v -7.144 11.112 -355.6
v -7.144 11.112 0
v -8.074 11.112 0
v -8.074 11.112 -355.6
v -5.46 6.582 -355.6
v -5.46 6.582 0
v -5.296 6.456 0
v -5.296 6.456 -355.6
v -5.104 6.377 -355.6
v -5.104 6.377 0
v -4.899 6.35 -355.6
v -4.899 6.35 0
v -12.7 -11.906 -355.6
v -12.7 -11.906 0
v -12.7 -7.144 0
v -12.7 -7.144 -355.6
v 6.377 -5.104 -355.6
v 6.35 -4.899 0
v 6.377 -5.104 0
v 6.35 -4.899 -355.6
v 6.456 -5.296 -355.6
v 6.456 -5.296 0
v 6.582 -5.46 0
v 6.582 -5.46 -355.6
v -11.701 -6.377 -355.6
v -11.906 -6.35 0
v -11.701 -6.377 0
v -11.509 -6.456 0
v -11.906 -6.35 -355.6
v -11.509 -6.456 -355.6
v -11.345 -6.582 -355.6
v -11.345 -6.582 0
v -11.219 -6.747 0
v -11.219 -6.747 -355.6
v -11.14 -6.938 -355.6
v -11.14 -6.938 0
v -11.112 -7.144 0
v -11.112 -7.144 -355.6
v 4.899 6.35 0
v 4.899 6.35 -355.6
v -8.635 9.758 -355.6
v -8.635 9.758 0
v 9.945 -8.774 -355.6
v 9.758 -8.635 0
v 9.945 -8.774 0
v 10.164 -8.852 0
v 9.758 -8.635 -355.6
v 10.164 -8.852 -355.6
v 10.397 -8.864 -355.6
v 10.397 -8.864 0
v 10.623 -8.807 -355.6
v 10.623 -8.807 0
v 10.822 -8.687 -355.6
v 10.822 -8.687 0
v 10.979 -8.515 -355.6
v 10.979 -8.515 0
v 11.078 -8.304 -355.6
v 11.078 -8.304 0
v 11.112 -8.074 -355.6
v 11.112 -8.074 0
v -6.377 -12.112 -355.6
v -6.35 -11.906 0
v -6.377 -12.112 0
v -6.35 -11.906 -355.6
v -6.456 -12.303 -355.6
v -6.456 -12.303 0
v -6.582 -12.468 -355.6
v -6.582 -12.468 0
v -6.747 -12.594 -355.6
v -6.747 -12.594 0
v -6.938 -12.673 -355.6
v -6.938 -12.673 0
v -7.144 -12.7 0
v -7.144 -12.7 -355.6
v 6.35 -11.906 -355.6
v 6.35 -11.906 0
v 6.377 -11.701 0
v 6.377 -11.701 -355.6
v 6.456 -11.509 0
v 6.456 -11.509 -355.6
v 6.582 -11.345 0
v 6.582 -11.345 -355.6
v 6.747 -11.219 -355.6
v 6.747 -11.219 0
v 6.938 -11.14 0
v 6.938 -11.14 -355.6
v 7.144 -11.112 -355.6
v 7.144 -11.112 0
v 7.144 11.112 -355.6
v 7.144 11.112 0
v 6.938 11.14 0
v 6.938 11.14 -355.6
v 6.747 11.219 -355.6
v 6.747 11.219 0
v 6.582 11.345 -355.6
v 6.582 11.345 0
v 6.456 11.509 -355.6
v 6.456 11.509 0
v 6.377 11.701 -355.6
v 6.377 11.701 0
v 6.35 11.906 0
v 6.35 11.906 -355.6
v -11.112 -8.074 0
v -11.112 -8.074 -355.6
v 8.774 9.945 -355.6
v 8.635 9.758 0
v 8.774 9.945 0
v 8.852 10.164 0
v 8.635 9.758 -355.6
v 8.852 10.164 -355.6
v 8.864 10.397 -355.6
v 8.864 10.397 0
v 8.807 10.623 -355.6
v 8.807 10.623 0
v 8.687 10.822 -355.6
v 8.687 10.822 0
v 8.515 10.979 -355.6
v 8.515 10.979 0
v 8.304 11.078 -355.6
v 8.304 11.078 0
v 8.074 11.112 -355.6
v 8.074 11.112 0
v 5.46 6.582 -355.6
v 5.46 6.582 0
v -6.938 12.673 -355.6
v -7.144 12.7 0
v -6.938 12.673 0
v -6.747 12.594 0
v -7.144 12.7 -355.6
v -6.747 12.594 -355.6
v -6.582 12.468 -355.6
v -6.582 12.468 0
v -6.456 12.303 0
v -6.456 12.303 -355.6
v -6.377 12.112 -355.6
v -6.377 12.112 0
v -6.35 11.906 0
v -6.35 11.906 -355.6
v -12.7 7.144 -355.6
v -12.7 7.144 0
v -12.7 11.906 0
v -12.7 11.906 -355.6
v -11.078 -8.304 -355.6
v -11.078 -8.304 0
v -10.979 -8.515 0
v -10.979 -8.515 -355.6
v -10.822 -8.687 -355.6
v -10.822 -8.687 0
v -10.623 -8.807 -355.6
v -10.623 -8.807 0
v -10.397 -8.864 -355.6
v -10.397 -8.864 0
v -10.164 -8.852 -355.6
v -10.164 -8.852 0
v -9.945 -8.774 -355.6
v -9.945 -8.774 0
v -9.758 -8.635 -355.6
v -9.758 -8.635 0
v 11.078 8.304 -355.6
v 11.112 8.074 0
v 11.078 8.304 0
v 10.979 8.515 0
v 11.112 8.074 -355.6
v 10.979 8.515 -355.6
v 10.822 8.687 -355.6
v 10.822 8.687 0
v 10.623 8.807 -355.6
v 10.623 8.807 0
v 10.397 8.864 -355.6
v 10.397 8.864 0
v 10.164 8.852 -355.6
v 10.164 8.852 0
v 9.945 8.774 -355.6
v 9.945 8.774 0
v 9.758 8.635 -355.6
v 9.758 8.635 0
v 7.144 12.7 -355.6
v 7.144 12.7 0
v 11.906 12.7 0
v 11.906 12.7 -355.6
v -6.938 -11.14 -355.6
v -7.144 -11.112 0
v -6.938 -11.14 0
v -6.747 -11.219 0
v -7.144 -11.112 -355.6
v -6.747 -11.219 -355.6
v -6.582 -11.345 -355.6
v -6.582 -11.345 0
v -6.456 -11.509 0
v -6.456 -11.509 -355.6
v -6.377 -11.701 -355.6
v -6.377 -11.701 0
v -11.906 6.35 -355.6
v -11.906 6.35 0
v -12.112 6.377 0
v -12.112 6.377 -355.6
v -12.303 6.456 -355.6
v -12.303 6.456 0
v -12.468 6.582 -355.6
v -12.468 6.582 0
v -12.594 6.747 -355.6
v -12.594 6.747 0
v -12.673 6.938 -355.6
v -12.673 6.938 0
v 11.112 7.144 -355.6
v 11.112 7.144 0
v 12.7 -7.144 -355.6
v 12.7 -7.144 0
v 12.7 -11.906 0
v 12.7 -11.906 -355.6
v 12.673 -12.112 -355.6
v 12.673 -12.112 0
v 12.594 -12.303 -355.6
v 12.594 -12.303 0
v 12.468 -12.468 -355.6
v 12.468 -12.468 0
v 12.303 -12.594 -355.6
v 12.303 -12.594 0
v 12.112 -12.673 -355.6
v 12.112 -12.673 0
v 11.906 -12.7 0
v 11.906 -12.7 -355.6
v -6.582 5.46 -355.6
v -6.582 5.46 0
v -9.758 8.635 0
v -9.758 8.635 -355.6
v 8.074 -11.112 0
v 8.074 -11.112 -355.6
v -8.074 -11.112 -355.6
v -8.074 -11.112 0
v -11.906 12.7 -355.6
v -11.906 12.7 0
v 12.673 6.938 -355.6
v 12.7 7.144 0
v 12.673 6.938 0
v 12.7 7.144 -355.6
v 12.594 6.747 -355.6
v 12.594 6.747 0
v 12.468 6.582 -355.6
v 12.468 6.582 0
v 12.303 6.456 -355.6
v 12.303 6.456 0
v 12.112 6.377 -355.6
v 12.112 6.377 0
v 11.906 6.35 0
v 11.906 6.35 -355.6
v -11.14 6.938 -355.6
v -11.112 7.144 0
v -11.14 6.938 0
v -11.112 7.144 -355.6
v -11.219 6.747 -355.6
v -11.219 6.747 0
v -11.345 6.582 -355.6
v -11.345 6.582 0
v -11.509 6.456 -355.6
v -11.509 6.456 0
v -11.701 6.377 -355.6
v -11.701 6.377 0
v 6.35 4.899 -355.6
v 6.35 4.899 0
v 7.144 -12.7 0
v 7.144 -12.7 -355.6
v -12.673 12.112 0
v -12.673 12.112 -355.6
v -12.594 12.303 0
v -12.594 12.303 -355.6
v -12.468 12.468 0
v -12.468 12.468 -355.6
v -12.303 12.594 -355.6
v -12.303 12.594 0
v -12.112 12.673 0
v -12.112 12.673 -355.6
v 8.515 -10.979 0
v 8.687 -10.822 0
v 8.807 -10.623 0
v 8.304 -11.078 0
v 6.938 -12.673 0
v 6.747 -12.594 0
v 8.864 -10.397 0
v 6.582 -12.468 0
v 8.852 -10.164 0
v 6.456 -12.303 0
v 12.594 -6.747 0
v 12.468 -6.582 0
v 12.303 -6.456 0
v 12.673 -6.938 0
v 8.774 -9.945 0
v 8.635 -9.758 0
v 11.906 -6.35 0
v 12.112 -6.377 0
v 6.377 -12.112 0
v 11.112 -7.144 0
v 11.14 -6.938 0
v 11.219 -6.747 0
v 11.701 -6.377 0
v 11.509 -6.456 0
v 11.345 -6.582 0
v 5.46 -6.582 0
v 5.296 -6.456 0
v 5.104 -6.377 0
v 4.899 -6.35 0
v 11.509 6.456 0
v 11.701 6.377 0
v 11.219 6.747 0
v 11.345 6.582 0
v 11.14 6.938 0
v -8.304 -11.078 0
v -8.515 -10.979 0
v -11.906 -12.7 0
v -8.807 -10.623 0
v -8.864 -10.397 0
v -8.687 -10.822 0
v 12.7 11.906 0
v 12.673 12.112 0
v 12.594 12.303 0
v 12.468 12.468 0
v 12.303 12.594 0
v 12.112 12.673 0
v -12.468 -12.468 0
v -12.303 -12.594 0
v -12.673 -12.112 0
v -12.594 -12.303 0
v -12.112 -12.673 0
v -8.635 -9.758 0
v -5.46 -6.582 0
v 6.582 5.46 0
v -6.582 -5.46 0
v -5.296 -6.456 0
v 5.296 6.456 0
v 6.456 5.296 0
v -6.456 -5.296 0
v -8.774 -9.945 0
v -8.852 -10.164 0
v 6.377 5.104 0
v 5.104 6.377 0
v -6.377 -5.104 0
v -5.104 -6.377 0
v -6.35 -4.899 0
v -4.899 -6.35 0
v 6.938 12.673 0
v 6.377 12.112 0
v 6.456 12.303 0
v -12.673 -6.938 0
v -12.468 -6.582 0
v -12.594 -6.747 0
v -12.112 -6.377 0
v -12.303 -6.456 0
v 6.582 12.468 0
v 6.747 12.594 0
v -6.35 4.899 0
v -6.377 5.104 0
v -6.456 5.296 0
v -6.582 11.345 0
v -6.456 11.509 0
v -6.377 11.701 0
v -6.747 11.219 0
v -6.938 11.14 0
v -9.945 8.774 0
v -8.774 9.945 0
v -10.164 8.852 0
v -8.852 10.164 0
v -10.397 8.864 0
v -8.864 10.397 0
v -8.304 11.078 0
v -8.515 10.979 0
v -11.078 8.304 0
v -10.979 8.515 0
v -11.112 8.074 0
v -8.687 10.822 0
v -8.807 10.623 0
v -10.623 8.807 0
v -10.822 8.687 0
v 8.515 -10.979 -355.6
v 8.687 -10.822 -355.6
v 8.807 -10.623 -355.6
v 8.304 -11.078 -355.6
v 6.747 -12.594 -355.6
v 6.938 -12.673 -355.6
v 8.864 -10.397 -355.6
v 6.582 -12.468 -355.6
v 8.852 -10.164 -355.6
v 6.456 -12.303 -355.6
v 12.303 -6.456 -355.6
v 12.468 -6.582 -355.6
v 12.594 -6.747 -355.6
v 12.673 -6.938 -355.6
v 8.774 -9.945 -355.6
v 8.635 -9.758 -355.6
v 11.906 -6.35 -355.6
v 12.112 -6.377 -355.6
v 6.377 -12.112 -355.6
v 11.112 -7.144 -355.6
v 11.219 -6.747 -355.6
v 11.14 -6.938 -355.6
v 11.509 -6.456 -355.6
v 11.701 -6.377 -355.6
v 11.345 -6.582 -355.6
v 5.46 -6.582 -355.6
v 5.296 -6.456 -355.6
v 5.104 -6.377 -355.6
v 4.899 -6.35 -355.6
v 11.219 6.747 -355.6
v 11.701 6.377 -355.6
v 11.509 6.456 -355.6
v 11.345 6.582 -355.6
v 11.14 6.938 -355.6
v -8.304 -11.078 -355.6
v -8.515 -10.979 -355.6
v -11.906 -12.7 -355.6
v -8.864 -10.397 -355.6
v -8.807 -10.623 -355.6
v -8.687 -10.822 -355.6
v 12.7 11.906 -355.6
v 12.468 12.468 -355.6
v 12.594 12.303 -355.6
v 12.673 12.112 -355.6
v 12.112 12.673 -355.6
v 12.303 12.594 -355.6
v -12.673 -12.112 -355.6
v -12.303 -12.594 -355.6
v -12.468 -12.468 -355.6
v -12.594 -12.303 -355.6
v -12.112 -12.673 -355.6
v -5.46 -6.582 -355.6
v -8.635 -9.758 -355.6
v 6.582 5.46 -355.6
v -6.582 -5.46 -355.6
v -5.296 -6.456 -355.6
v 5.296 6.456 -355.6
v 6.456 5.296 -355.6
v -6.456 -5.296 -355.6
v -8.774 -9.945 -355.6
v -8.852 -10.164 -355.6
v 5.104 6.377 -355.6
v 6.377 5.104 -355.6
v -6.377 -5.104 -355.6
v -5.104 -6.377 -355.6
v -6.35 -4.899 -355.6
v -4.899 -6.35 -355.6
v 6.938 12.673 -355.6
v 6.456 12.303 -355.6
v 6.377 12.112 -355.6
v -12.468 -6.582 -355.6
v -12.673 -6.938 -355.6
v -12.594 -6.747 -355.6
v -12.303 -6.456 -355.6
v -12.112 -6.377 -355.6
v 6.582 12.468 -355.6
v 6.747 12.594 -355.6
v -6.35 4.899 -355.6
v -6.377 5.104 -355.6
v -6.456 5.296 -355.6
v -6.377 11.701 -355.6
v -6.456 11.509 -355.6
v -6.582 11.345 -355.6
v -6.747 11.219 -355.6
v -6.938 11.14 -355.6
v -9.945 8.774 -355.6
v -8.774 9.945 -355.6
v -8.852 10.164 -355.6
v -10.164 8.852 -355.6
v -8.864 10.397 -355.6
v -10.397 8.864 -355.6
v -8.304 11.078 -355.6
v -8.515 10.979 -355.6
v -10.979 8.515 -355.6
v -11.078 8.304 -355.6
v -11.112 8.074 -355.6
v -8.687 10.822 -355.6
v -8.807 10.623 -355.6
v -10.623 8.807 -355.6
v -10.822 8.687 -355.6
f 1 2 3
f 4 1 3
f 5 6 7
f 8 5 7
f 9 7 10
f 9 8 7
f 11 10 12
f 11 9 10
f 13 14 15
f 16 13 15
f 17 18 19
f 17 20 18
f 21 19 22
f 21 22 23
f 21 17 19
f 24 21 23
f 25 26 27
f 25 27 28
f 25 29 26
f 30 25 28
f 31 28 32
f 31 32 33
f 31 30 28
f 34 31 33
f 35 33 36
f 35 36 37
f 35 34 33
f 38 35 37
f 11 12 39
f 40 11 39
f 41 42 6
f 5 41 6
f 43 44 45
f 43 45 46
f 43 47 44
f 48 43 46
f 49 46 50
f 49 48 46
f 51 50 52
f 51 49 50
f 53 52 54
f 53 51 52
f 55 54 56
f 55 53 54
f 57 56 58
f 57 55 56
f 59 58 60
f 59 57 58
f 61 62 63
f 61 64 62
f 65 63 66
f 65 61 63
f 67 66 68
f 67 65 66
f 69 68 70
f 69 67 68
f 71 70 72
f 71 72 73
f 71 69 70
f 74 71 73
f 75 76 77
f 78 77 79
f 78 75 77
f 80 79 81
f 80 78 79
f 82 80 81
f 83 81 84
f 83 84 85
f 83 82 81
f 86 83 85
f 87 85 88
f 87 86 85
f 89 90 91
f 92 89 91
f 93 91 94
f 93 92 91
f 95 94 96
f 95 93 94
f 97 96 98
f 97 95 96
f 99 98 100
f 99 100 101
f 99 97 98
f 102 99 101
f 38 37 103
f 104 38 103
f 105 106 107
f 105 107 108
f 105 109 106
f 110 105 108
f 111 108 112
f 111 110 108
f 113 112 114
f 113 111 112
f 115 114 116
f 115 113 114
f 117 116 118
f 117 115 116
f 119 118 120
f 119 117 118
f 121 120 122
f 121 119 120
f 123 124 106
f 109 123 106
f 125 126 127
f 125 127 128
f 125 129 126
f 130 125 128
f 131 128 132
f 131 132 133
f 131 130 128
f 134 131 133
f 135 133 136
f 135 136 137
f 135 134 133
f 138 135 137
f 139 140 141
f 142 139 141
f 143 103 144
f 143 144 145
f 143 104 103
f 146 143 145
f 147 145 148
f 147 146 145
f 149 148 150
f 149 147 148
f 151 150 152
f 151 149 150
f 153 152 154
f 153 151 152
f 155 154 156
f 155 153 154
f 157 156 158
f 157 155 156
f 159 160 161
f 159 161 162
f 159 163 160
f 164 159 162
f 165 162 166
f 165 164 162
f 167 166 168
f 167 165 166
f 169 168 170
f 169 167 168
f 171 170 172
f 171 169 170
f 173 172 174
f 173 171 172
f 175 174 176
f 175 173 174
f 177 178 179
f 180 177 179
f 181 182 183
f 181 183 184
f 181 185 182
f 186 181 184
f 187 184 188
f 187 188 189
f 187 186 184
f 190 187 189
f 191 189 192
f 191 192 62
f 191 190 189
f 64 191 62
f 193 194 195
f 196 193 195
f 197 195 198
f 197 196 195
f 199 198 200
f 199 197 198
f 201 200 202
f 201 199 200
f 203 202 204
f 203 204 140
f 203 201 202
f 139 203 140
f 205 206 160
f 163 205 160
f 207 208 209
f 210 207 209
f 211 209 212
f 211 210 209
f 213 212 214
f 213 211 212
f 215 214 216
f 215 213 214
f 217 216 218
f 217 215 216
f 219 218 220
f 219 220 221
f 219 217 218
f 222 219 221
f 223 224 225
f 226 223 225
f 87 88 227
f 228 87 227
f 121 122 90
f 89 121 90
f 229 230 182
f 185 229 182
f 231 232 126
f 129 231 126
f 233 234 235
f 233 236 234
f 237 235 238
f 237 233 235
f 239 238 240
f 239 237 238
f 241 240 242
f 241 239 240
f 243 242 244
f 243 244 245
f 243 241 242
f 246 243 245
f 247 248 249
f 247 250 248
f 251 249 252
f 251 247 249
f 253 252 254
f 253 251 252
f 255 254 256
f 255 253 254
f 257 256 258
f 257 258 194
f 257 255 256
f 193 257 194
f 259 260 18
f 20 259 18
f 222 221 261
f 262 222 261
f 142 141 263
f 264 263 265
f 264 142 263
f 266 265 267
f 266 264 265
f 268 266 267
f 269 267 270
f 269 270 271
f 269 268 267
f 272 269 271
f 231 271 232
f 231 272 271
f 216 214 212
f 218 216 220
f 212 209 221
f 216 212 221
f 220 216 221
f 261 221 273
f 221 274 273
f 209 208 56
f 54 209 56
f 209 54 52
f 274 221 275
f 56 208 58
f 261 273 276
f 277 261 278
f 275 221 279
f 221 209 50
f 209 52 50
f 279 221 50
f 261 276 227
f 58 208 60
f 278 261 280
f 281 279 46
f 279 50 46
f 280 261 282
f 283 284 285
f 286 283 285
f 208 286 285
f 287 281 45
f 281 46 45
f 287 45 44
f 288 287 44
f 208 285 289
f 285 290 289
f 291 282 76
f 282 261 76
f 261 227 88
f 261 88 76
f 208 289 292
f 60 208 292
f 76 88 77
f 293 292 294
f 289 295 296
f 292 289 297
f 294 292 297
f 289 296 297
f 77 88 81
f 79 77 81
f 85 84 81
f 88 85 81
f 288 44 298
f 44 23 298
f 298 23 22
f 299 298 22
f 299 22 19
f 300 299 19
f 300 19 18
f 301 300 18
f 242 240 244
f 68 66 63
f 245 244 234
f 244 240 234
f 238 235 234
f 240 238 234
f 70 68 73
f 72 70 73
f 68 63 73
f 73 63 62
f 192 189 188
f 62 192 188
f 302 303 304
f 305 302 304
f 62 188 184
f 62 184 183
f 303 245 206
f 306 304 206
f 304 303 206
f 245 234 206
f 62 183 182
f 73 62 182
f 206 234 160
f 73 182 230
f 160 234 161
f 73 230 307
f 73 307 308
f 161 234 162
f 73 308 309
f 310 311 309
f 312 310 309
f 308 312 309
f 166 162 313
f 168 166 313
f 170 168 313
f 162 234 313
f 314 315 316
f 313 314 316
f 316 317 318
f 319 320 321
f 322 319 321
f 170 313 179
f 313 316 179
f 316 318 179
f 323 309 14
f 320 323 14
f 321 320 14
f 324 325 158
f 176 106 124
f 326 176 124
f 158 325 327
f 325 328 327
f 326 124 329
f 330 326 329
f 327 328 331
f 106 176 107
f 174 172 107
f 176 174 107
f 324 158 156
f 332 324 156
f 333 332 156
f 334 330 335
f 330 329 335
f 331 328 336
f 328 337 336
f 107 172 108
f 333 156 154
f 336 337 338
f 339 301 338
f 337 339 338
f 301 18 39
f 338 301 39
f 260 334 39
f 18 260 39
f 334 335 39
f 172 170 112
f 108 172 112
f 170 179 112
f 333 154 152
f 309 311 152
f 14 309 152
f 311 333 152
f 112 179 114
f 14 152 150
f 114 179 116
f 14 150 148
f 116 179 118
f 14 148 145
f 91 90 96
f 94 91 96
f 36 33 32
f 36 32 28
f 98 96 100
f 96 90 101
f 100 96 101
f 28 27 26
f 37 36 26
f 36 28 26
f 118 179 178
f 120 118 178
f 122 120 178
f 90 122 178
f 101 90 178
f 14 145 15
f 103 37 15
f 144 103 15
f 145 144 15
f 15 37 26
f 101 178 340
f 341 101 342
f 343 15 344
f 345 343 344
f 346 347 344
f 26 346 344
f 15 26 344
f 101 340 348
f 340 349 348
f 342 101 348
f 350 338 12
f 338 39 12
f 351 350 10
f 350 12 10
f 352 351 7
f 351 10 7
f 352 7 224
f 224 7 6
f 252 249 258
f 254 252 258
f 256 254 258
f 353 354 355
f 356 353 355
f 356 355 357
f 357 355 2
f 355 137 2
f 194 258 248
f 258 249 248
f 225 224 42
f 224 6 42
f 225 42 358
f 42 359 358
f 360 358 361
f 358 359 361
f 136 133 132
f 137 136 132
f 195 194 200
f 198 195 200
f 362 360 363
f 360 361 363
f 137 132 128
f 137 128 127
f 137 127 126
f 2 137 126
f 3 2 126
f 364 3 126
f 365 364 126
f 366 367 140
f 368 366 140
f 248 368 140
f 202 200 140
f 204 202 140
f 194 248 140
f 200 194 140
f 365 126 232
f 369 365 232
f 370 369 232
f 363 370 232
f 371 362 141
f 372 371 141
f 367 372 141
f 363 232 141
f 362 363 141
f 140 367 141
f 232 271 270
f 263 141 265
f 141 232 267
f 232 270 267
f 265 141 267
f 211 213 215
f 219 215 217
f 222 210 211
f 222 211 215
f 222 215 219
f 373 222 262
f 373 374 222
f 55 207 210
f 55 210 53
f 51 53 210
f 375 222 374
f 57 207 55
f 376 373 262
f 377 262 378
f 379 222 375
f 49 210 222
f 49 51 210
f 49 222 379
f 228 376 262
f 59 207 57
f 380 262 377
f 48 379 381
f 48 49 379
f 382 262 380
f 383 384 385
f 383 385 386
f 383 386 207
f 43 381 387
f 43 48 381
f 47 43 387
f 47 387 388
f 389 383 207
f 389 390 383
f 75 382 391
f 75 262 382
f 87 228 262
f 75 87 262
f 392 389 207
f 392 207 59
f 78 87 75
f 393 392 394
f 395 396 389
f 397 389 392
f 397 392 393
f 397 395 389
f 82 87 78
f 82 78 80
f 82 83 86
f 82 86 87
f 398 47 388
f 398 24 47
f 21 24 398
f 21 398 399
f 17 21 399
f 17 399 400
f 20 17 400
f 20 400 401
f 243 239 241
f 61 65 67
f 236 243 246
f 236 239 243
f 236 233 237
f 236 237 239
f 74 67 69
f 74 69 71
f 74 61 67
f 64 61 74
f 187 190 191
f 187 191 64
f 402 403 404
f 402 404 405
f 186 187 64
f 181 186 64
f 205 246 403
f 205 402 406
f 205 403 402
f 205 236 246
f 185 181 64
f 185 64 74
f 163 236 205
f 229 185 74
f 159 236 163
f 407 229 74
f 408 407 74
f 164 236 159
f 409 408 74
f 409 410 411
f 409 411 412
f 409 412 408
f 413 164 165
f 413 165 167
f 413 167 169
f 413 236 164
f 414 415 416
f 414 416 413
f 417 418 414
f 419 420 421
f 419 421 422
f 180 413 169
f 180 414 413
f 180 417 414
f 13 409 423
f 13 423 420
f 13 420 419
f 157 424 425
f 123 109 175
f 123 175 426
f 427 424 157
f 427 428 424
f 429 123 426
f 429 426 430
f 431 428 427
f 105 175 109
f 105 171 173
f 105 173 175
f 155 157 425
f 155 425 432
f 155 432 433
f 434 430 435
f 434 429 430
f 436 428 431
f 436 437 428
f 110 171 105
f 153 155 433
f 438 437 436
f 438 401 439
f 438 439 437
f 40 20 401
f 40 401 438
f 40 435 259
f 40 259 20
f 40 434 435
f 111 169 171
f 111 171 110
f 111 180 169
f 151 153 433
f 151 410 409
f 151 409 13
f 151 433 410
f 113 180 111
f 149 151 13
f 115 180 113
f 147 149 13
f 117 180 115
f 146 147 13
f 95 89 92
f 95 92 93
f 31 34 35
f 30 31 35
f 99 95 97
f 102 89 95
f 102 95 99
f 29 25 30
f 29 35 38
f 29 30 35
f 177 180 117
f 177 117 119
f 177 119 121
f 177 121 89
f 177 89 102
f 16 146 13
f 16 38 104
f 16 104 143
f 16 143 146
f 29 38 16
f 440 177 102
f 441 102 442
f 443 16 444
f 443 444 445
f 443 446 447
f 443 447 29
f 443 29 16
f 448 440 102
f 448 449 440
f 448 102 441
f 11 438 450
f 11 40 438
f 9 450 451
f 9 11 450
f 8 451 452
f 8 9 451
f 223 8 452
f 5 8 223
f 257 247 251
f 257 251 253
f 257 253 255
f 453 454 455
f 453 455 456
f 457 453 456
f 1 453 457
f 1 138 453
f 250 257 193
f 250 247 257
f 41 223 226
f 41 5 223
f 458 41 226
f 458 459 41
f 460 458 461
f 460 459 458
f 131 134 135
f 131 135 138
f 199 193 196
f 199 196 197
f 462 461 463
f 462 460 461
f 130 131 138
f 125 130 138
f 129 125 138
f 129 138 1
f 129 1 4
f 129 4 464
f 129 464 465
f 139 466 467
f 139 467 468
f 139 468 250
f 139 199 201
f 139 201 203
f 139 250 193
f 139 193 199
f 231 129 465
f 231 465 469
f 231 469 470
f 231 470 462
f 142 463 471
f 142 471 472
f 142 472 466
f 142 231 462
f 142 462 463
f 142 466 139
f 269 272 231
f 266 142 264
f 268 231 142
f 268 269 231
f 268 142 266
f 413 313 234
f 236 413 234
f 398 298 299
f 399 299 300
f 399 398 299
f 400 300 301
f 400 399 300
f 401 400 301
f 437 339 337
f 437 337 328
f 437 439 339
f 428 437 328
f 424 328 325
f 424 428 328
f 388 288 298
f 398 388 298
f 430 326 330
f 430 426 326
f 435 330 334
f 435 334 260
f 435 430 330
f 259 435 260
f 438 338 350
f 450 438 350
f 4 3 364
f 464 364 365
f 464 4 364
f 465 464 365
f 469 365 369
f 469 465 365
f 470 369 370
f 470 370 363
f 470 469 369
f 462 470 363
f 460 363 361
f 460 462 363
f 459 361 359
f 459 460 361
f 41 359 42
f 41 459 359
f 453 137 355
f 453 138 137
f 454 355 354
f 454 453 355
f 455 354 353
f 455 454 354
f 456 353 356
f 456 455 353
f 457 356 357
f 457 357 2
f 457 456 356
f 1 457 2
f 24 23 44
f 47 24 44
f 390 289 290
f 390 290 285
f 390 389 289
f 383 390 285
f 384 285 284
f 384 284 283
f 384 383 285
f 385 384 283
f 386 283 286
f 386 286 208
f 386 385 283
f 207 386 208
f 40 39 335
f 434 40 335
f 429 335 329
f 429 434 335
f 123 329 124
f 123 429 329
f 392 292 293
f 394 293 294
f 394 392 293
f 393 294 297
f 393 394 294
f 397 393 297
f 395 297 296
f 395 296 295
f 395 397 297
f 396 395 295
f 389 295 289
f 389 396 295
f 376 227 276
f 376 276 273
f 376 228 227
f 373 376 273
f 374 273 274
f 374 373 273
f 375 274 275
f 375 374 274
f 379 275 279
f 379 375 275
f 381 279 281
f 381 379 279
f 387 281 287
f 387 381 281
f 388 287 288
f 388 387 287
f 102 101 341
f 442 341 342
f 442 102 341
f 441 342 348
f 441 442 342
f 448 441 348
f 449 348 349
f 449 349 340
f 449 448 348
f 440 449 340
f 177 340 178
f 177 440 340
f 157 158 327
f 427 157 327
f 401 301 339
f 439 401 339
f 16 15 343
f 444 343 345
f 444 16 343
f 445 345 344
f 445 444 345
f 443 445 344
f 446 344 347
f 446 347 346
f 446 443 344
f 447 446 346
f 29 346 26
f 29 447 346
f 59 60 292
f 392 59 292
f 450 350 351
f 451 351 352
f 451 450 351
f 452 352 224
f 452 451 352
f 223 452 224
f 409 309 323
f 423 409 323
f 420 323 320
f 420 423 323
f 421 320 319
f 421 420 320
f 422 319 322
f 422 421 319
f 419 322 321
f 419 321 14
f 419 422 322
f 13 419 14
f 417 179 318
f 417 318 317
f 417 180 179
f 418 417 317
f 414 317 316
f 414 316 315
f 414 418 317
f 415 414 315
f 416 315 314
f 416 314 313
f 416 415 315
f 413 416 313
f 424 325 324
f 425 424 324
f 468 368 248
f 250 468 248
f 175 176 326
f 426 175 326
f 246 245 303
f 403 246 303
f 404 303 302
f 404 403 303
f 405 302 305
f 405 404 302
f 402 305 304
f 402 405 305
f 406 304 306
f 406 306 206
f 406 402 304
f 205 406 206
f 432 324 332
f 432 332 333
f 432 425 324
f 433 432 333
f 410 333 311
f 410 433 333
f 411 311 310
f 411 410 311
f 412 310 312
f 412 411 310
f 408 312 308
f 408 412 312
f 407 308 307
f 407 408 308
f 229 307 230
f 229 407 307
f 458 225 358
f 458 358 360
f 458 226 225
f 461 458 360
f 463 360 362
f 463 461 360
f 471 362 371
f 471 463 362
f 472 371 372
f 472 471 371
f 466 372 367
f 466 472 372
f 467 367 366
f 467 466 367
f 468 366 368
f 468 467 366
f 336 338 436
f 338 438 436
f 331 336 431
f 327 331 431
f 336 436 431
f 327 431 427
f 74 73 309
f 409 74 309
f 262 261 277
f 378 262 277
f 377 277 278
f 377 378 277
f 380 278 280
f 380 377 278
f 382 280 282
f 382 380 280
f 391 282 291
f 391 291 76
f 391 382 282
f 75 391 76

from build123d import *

# Parameters (mm, degrees)
BOSS_EXTRUDE1_DEPTH = 355.6
FILLET1_R           = 0.79375


with BuildPart() as part:
    # Sketch1 → Boss-Extrude1 (new body)
    with BuildSketch(Plane.XY):
        Polygon((-6.35, -5.227467985), (-6.35, 5.227467985), (-11.1125, 9.989967985), (-11.1125, 6.35), (-12.7, 6.35), (-12.7, 12.7), (-6.35, 12.7), (-6.35, 11.1125), (-9.989967985, 11.1125), (-5.227467985, 6.35), (5.227467985, 6.35), (9.989967985, 11.1125), (6.35, 11.1125), (6.35, 12.7), (12.7, 12.7), (12.7, 6.35), (11.1125, 6.35), (11.1125, 9.989967985), (6.35, 5.227467985), (6.35, -5.227467985), (11.1125, -9.989967985), (11.1125, -6.35), (12.7, -6.35), (12.7, -12.7), (6.35, -12.7), (6.35, -11.1125), (9.989967985, -11.1125), (5.227467985, -6.35), (-5.227467985, -6.35), (-9.989967985, -11.1125), (-6.35, -11.1125), (-6.35, -12.7), (-12.7, -12.7), (-12.7, -6.35), (-11.1125, -6.35), (-11.1125, -9.989967985), align=None)
    extrude(amount=-BOSS_EXTRUDE1_DEPTH)

    # Fillet1
    fillet1_edges = [part.edges().sort_by_distance(p)[0] for p in [
        (-6.35, -11.1125, -177.8),
        (-6.35, -12.7, -177.8),
        (-12.7, -12.7, -177.8),
        (-12.7, -6.35, -177.8),
        (-11.1125, -6.35, -177.8),
        (-11.1125, -9.989967985, -177.8),
        (-6.35, -5.227467985, -177.8),
        (-6.35, 5.227467985, -177.8),
        (-11.1125, 9.989967985, -177.8),
        (-11.1125, 6.35, -177.8),
        (-12.7, 6.35, -177.8),
        (-12.7, 12.7, -177.8),
        (-6.35, 12.7, -177.8),
        (-6.35, 11.1125, -177.8),
        (-9.989967985, 11.1125, -177.8),
        (-5.227467985, 6.35, -177.8),
        (5.227467985, 6.35, -177.8),
        (9.989967985, 11.1125, -177.8),
        (6.35, 11.1125, -177.8),
        (6.35, 12.7, -177.8),
        (12.7, 12.7, -177.8),
        (12.7, 6.35, -177.8),
        (11.1125, 6.35, -177.8),
        (11.1125, 9.989967985, -177.8),
        (6.35, 5.227467985, -177.8),
        (6.35, -5.227467985, -177.8),
        (11.1125, -9.989967985, -177.8),
        (11.1125, -6.35, -177.8),
        (12.7, -6.35, -177.8),
        (12.7, -12.7, -177.8),
        (6.35, -12.7, -177.8),
        (6.35, -11.1125, -177.8),
        (9.989967985, -11.1125, -177.8),
        (5.227467985, -6.35, -177.8),
        (-5.227467985, -6.35, -177.8),
        (-9.989967985, -11.1125, -177.8),
    ]]
    fillet(fillet1_edges, radius=FILLET1_R - 0.0001)  # a hair under: the kernel refuses the full size


solid = part.part
